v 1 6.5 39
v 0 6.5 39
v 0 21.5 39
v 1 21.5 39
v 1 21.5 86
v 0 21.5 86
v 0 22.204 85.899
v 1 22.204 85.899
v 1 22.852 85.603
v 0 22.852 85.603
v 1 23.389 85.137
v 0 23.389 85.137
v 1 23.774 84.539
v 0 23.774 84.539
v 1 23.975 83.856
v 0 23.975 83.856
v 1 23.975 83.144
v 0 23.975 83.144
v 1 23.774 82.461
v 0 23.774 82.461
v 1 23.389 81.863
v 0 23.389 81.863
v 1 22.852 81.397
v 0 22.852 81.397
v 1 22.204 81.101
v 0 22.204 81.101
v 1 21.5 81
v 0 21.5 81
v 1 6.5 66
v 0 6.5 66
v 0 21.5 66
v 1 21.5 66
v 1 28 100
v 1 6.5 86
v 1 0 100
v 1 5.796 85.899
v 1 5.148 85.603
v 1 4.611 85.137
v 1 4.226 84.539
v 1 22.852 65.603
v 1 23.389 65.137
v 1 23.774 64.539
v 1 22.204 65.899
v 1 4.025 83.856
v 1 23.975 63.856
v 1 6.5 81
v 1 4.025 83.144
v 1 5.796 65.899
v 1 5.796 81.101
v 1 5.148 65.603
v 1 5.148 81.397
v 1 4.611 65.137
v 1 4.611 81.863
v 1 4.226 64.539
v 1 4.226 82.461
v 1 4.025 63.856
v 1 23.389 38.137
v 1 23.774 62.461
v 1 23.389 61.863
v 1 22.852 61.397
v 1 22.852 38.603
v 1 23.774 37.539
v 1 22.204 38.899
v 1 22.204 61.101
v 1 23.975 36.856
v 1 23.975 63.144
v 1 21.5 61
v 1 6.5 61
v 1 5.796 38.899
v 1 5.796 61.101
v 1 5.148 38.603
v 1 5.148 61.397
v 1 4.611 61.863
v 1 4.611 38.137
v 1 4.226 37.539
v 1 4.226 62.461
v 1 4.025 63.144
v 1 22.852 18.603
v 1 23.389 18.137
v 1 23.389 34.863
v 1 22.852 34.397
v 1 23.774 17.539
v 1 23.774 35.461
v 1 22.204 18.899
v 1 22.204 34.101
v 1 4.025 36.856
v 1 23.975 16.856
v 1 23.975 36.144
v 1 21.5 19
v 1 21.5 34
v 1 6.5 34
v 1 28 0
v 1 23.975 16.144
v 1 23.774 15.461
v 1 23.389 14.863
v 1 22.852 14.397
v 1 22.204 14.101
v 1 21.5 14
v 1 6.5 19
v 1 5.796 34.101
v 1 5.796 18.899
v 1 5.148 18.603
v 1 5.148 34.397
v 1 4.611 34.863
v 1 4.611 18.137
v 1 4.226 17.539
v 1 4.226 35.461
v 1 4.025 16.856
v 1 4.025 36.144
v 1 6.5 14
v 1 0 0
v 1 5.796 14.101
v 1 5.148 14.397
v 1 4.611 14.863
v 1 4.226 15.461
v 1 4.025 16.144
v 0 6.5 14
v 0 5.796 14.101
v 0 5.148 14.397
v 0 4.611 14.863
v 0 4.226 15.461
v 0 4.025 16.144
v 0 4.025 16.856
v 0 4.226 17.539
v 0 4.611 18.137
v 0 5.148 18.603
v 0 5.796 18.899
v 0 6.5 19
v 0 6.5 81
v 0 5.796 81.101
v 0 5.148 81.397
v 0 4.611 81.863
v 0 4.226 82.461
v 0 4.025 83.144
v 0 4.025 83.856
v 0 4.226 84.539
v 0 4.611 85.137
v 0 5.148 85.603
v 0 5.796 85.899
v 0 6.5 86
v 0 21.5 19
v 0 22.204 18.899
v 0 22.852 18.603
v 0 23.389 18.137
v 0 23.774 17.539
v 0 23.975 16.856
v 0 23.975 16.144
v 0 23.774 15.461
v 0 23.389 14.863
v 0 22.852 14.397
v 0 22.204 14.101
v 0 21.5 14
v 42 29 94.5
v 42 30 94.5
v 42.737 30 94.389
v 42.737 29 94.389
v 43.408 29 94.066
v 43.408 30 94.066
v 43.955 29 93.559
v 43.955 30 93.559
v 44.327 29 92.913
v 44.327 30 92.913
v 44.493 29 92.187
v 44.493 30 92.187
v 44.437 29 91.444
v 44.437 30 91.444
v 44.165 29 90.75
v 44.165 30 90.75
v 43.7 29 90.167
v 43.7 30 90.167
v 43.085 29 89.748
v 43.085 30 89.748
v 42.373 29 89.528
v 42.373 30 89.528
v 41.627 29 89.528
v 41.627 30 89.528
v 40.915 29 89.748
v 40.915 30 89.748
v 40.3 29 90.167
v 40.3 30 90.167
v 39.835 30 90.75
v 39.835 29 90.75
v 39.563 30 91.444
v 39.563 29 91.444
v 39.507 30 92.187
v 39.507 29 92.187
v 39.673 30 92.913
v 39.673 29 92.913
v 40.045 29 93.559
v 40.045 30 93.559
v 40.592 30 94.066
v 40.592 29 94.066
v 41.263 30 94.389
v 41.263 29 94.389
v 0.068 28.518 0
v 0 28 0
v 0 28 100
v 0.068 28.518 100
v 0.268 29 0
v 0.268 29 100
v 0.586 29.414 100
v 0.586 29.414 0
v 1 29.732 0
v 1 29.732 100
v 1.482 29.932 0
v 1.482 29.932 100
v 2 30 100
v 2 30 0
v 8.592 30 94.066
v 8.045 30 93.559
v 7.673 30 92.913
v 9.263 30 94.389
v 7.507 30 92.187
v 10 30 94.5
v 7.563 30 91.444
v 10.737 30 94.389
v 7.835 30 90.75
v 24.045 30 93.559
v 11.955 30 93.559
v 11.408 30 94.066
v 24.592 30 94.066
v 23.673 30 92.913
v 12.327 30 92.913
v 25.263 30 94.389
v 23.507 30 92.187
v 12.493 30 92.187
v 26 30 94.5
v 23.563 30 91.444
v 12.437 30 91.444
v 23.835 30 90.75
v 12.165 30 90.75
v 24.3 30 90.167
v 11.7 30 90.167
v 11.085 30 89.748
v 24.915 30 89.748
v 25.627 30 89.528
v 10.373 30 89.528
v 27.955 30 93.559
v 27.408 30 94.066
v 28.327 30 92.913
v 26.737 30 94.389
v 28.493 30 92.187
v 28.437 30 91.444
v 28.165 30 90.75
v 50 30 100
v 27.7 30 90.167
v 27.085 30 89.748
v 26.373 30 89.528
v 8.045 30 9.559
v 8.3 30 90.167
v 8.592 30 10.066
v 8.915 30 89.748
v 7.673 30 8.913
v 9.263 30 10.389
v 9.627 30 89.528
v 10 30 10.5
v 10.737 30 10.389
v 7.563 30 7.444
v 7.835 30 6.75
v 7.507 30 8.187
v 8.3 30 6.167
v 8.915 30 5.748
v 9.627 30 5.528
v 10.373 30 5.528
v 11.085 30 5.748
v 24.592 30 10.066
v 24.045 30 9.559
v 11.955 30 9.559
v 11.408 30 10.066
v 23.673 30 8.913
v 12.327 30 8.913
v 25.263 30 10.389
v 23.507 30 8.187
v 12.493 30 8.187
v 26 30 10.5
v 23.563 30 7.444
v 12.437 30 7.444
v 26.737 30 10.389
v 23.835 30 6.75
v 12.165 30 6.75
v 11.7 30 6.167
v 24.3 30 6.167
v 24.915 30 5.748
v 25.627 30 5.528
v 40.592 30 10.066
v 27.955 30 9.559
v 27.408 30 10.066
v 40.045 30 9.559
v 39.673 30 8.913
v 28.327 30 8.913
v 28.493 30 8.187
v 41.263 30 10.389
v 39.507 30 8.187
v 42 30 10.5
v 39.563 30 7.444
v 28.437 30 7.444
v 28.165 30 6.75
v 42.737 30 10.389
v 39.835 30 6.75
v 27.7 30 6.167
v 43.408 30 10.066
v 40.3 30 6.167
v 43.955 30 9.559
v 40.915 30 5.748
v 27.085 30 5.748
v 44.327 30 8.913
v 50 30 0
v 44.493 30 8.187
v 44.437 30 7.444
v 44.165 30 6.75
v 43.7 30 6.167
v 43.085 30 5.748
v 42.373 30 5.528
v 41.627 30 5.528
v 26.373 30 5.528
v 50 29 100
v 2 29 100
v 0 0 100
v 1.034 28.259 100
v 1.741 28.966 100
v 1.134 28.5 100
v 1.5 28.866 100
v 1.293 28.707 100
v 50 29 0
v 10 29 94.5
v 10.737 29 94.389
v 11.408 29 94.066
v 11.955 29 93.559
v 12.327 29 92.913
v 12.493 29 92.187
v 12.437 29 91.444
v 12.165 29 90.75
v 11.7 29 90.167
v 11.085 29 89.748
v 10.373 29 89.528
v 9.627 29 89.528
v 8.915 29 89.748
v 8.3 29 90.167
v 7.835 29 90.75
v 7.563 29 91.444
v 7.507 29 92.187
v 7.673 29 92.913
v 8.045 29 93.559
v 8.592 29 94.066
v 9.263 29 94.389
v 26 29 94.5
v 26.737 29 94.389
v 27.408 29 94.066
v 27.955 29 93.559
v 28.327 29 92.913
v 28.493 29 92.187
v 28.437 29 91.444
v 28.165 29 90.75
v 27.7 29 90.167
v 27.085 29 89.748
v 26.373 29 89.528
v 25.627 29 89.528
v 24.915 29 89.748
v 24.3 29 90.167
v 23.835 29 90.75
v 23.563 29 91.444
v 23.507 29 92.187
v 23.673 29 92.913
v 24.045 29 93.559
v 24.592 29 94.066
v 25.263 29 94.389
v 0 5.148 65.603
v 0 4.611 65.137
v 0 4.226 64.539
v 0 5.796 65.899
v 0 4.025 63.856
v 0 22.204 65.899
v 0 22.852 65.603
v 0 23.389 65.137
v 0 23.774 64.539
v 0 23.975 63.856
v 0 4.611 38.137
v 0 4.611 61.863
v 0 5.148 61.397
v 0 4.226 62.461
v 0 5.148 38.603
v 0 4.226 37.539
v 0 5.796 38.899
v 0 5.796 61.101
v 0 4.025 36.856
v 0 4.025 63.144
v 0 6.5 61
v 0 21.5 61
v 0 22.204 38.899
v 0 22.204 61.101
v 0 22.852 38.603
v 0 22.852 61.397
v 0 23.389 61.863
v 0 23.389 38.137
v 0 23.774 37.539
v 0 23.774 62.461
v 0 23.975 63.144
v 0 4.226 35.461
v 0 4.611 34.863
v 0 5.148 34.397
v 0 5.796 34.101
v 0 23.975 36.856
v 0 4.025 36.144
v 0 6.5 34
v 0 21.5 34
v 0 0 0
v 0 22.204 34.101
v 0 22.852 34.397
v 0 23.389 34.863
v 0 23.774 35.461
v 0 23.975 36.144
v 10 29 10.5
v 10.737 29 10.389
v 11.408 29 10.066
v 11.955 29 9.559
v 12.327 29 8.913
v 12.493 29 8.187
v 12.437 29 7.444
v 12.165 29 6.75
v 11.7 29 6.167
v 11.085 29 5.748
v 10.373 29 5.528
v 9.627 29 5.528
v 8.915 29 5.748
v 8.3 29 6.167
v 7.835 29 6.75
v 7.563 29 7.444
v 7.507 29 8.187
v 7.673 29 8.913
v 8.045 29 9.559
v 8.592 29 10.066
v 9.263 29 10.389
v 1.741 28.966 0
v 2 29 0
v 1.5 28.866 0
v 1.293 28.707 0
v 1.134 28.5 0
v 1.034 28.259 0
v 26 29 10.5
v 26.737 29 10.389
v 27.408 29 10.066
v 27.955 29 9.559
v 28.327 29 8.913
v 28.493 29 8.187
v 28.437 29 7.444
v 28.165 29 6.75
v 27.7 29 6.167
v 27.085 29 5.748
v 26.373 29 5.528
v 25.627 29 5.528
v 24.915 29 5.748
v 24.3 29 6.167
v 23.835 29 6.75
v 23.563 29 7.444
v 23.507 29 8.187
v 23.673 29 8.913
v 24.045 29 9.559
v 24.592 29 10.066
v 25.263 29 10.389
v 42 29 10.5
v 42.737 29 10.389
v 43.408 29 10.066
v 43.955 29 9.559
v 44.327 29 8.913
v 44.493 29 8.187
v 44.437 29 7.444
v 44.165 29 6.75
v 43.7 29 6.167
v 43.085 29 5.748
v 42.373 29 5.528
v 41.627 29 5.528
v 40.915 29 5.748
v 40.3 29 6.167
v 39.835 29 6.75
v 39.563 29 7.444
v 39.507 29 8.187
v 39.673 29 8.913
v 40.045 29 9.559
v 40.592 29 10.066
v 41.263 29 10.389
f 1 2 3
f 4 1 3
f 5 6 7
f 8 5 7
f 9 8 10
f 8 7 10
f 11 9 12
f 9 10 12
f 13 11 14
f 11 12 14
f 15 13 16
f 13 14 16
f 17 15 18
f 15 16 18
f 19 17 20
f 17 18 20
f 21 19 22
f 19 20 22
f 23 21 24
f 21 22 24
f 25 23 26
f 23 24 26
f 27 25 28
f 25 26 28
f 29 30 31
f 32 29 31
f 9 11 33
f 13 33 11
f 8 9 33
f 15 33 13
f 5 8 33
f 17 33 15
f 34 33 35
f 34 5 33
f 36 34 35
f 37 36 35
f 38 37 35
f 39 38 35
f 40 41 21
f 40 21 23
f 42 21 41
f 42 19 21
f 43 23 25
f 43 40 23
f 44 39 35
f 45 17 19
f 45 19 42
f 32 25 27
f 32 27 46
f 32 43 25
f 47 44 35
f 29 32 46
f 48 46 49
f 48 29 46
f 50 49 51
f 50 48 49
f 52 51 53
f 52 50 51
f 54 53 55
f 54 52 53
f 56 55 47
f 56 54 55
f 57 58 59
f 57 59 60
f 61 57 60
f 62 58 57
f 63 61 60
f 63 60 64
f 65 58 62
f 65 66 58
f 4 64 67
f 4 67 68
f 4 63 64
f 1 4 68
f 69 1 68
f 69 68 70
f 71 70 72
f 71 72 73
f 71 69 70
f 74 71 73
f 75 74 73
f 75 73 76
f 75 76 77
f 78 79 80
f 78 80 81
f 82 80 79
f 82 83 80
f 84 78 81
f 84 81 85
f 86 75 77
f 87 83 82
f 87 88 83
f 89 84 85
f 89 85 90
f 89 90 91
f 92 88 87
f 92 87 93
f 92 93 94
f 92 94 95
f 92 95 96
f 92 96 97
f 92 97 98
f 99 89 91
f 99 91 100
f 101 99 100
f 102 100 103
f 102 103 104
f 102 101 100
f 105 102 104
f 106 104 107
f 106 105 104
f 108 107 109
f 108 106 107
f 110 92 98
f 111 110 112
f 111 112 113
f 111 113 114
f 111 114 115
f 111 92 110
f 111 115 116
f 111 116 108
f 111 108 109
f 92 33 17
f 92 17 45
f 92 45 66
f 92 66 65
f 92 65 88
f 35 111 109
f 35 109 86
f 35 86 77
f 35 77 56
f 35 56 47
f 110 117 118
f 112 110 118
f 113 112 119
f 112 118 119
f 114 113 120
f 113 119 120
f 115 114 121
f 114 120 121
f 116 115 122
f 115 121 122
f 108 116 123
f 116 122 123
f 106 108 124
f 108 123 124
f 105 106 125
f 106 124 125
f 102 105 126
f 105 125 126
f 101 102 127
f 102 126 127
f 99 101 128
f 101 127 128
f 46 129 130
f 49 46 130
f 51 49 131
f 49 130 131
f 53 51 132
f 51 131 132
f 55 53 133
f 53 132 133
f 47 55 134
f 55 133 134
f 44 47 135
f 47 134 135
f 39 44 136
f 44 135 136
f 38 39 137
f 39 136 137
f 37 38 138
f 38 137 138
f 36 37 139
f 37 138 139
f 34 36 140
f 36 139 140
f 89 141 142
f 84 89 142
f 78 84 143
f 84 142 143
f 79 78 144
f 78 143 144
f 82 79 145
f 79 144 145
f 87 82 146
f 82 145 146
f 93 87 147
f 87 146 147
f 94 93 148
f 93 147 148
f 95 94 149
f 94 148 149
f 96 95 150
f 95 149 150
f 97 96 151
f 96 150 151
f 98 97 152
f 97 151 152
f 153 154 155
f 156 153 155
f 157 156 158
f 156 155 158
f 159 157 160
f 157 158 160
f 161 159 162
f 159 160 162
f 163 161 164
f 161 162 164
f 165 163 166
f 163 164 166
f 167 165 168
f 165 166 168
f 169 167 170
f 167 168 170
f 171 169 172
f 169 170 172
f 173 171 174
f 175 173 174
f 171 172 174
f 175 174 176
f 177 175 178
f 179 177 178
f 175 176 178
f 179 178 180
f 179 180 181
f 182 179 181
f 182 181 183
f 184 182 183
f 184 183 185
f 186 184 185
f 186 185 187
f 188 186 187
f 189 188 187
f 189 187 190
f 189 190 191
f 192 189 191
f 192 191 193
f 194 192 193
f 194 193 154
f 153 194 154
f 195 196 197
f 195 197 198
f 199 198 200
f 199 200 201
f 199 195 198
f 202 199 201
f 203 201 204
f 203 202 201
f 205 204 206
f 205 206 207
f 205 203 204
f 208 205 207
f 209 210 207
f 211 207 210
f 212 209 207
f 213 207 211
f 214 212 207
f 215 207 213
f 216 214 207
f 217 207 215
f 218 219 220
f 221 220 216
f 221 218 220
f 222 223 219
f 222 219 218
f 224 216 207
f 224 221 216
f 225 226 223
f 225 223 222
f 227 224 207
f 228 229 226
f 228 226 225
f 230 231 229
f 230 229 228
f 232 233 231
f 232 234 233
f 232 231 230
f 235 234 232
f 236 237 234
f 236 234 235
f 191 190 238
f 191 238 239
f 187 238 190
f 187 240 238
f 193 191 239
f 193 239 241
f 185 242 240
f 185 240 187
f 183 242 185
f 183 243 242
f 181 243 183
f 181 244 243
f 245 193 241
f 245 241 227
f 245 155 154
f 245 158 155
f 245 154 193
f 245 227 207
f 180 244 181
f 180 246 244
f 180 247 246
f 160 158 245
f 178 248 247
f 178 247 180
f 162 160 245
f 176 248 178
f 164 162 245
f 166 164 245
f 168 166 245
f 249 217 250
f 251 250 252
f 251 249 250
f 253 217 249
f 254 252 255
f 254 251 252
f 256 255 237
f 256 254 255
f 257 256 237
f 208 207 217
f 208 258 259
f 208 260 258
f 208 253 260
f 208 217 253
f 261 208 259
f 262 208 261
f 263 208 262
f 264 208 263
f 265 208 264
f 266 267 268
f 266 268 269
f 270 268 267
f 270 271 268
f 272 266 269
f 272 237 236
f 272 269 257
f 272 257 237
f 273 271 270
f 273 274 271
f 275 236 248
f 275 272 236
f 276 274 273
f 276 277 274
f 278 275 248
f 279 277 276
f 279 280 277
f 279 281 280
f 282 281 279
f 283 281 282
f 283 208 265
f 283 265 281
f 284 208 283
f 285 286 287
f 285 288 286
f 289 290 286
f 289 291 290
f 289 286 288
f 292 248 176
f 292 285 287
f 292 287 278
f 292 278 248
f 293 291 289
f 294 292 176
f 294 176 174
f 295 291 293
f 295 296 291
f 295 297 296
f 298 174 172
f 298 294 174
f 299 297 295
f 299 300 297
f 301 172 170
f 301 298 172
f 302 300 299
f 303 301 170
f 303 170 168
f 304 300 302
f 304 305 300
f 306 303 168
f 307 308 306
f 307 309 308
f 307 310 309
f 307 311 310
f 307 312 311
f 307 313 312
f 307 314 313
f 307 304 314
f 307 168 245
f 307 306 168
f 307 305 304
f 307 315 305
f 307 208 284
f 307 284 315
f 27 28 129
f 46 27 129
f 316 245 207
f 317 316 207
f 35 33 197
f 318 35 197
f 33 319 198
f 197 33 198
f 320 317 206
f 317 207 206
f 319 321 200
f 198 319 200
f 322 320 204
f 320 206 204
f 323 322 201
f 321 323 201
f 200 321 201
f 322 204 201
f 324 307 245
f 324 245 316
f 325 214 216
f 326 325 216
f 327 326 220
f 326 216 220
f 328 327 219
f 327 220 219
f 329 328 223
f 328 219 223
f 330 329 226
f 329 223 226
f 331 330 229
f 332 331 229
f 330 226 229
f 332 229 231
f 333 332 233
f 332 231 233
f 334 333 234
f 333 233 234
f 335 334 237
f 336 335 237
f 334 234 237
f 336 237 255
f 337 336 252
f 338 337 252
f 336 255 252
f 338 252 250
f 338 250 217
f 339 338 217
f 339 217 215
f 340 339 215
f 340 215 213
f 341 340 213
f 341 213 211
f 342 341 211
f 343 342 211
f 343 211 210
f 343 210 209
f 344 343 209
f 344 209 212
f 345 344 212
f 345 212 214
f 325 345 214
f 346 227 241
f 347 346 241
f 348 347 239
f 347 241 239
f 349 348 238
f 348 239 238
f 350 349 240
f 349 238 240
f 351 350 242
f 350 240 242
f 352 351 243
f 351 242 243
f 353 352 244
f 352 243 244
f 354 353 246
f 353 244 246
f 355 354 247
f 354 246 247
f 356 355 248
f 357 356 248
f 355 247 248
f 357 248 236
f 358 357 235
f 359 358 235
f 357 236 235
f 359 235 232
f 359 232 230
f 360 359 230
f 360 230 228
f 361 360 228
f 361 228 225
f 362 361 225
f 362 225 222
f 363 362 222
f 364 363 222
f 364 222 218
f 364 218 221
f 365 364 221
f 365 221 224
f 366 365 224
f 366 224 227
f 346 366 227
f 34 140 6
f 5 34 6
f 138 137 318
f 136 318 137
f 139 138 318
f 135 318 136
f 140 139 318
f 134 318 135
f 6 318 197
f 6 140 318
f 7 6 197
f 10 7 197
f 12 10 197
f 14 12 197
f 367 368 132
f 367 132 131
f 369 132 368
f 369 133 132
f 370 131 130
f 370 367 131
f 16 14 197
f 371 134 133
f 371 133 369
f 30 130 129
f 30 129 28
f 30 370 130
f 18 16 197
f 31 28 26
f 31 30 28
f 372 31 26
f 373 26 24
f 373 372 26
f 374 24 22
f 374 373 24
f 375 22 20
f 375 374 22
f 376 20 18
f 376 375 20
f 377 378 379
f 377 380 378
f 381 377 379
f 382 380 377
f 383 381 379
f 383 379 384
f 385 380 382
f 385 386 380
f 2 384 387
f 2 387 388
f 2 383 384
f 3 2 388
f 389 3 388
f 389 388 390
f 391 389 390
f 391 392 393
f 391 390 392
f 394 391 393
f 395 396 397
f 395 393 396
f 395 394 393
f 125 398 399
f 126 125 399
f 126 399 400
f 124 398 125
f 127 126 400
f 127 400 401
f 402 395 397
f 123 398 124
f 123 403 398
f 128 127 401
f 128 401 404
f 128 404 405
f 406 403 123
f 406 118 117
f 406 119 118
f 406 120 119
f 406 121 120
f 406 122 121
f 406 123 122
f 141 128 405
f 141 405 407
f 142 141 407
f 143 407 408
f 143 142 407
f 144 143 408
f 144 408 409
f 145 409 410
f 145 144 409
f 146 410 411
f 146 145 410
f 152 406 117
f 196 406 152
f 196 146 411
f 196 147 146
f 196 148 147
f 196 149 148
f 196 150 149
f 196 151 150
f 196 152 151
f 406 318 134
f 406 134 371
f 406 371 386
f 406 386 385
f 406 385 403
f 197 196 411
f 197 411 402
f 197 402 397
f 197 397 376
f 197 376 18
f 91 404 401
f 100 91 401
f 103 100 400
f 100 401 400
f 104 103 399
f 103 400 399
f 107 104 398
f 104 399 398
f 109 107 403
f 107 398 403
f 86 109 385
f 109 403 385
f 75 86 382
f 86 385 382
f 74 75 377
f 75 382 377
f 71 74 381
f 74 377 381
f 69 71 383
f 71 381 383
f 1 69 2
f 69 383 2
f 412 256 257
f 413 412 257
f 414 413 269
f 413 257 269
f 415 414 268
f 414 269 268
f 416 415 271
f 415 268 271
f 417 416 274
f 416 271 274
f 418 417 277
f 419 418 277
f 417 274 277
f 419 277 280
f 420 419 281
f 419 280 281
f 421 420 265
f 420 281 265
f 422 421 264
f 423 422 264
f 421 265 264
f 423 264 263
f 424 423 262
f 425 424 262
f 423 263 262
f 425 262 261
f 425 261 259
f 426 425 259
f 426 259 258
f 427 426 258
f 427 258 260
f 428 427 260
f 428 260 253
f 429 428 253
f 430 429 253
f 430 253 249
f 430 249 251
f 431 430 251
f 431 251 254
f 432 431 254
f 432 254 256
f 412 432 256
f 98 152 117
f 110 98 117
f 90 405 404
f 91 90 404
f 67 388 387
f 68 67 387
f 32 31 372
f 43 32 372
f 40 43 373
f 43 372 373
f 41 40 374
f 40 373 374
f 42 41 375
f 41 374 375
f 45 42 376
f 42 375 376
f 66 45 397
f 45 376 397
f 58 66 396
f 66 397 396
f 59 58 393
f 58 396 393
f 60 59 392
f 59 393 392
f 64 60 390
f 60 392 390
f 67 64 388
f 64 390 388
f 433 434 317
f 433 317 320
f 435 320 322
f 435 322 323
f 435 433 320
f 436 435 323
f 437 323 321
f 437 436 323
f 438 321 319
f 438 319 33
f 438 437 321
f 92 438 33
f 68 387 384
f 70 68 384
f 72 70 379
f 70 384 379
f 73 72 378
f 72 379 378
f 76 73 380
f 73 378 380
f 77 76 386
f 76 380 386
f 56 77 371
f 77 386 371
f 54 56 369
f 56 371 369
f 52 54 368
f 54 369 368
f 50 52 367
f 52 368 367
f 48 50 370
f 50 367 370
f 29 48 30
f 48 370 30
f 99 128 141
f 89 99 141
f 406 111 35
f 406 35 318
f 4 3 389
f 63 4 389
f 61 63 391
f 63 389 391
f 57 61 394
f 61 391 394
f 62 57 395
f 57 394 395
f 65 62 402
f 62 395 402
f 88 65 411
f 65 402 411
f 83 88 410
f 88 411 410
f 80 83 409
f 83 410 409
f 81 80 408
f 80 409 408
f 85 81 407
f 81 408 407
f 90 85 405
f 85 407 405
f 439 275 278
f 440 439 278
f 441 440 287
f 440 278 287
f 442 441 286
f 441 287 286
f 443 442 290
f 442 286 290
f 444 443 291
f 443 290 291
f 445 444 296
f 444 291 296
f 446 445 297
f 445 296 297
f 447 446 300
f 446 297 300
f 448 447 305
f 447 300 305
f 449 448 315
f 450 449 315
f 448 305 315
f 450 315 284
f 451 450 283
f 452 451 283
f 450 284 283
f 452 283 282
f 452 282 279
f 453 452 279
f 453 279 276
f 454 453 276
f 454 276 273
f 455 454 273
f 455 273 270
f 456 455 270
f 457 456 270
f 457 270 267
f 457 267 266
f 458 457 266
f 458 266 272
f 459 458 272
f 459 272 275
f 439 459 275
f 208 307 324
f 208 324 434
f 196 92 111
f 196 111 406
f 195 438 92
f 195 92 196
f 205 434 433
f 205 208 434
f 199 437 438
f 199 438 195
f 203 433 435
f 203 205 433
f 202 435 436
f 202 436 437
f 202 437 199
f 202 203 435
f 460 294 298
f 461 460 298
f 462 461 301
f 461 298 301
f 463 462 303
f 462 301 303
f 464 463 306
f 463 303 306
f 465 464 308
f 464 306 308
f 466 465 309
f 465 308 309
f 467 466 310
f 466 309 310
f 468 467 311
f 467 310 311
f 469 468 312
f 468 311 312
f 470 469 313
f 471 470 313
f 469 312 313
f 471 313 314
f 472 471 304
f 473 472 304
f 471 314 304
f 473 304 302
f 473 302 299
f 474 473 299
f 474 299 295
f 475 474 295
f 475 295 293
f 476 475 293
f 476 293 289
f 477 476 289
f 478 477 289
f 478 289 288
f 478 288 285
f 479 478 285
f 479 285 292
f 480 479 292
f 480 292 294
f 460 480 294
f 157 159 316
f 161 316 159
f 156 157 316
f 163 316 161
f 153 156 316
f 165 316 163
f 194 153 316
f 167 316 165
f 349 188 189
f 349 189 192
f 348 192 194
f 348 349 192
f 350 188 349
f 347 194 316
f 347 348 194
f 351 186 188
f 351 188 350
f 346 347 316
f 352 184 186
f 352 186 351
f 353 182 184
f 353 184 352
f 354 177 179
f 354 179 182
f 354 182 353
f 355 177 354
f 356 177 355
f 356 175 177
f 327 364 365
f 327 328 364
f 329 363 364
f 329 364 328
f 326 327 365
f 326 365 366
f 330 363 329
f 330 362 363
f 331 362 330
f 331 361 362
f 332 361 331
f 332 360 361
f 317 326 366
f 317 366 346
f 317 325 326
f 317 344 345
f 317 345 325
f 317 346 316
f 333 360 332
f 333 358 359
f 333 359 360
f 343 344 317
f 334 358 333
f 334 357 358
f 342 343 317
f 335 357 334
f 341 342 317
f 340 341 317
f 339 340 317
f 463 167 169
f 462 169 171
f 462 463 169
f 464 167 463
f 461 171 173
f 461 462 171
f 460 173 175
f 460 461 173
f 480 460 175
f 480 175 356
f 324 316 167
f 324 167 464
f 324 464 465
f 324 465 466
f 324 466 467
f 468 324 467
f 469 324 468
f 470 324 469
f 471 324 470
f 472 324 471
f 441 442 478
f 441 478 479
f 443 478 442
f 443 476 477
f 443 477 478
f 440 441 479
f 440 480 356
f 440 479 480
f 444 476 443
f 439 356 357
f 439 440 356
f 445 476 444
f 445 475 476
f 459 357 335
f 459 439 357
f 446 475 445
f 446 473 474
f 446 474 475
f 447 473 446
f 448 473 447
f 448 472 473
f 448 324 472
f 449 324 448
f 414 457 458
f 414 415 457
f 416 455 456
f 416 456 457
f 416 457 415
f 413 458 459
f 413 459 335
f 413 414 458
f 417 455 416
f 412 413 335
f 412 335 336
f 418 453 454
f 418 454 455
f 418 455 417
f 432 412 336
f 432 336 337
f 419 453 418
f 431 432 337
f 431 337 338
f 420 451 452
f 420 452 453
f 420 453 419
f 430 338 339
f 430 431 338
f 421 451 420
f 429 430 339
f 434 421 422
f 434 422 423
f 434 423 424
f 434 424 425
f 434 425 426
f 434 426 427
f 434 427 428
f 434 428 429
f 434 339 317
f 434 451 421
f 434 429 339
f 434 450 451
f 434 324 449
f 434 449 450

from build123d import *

# Parameters (mm, degrees)
BASE_FLANGE1_DEPTH = 100
CUT_EXTRUDE3_REACH = 117.758
SKETCH8_R          = 2.5
CUT_EXTRUDE4_REACH = 117.758
SKETCH11_R         = 2.5


# Sheet-metal steps are written as plain solids
with BuildPart() as part:
    # Sketch2 → Base-Flange1 (new body)
    with BuildSketch(Plane.XY):
        with BuildLine():
            Line((0, 0), (0, 28))
            ThreePointArc((0, 28), (0.585786438, 29.414213562), (2, 30))
            Line((2, 30), (50, 30))
            Line((50, 30), (50, 29))
            Line((50, 29), (2, 29))
            ThreePointArc((2, 29), (1.292893219, 28.707106781), (1, 28))
            Line((1, 28), (1, 0))
            Line((1, 0), (0, 0))
        make_face()
    extrude(amount=BASE_FLANGE1_DEPTH)

    # Sketch8 → Cut-Extrude3 (cut, up to next)
    with BuildSketch(Plane(origin=(0, 30, 0), x_dir=(1, 0, 0), z_dir=(0, 1, 0)), mode=Mode.PRIVATE) as cut_extrude3_sk1:
        with Locations(Location((42, -8, 0), (0, 0, 270))):
            Circle(SKETCH8_R)
    cut_extrude3_tool1 = extrude(cut_extrude3_sk1.sketch, amount=-CUT_EXTRUDE3_REACH, mode=Mode.PRIVATE) & part.part
    # Sketch8 → Cut-Extrude3 (cut, up to next)
    with BuildSketch(Plane(origin=(0, 30, 0), x_dir=(1, 0, 0), z_dir=(0, 1, 0)), mode=Mode.PRIVATE) as cut_extrude3_sk2:
        with Locations(Location((10, -8, 0), (0, 0, 270))):
            Circle(SKETCH8_R)
    cut_extrude3_tool2 = extrude(cut_extrude3_sk2.sketch, amount=-CUT_EXTRUDE3_REACH, mode=Mode.PRIVATE) & part.part
    # Sketch8 → Cut-Extrude3 (cut, up to next)
    with BuildSketch(Plane(origin=(0, 30, 0), x_dir=(1, 0, 0), z_dir=(0, 1, 0)), mode=Mode.PRIVATE) as cut_extrude3_sk3:
        with Locations(Location((42, -92, 0), (0, 0, 270))):
            Circle(SKETCH8_R)
    cut_extrude3_tool3 = extrude(cut_extrude3_sk3.sketch, amount=-CUT_EXTRUDE3_REACH, mode=Mode.PRIVATE) & part.part
    # Sketch8 → Cut-Extrude3 (cut, up to next)
    with BuildSketch(Plane(origin=(0, 30, 0), x_dir=(1, 0, 0), z_dir=(0, 1, 0)), mode=Mode.PRIVATE) as cut_extrude3_sk4:
        with Locations(Location((10, -92, 0), (0, 0, 270))):
            Circle(SKETCH8_R)
    cut_extrude3_tool4 = extrude(cut_extrude3_sk4.sketch, amount=-CUT_EXTRUDE3_REACH, mode=Mode.PRIVATE) & part.part
    # Sketch8 → Cut-Extrude3 (cut, up to next)
    with BuildSketch(Plane(origin=(0, 30, 0), x_dir=(1, 0, 0), z_dir=(0, 1, 0)), mode=Mode.PRIVATE) as cut_extrude3_sk5:
        with Locations(Location((26, -8, 0), (0, 0, 270))):
            Circle(SKETCH8_R)
    cut_extrude3_tool5 = extrude(cut_extrude3_sk5.sketch, amount=-CUT_EXTRUDE3_REACH, mode=Mode.PRIVATE) & part.part
    # Sketch8 → Cut-Extrude3 (cut, up to next)
    with BuildSketch(Plane(origin=(0, 30, 0), x_dir=(1, 0, 0), z_dir=(0, 1, 0)), mode=Mode.PRIVATE) as cut_extrude3_sk6:
        with Locations(Location((26, -92, 0), (0, 0, 270))):
            Circle(SKETCH8_R)
    cut_extrude3_tool6 = extrude(cut_extrude3_sk6.sketch, amount=-CUT_EXTRUDE3_REACH, mode=Mode.PRIVATE) & part.part
    add(cut_extrude3_tool1.solids().sort_by_distance((42, 30, 8))[0], mode=Mode.SUBTRACT)
    add(cut_extrude3_tool2.solids().sort_by_distance((10, 30, 8))[0], mode=Mode.SUBTRACT)
    add(cut_extrude3_tool3.solids().sort_by_distance((42, 30, 92))[0], mode=Mode.SUBTRACT)
    add(cut_extrude3_tool4.solids().sort_by_distance((10, 30, 92))[0], mode=Mode.SUBTRACT)
    add(cut_extrude3_tool5.solids().sort_by_distance((26, 30, 8))[0], mode=Mode.SUBTRACT)
    add(cut_extrude3_tool6.solids().sort_by_distance((26, 30, 92))[0], mode=Mode.SUBTRACT)

    # Sketch11 → Cut-Extrude4 (cut, up to next)
    with BuildSketch(Plane.ZY, mode=Mode.PRIVATE) as cut_extrude4_sk1:
        with BuildLine():
            ThreePointArc((19, 21.5), (16.5, 24), (14, 21.5))
            Line((14, 21.5), (14, 13.999999995))
            ThreePointArc((14, 13.999999995), (16.499999997, 16.5), (19, 14))
            Line((19, 14), (19, 21.5))
        make_face()
    cut_extrude4_tool1 = extrude(cut_extrude4_sk1.sketch, amount=-CUT_EXTRUDE4_REACH, mode=Mode.PRIVATE) & part.part
    # Sketch11 → Cut-Extrude4 (cut, up to next)
    with BuildSketch(Plane.ZY, mode=Mode.PRIVATE) as cut_extrude4_sk2:
        with BuildLine():
            ThreePointArc((19, 14), (16.500000003, 11.5), (14, 13.999999995))
            Line((14, 13.999999995), (14, 6.5))
            ThreePointArc((14, 6.5), (16.5, 4), (19, 6.5))
            Line((19, 6.5), (19, 14))
        make_face()
    cut_extrude4_tool2 = extrude(cut_extrude4_sk2.sketch, amount=-CUT_EXTRUDE4_REACH, mode=Mode.PRIVATE) & part.part
    # Sketch11 → Cut-Extrude4 (cut, up to next)
    with BuildSketch(Plane.ZY, mode=Mode.PRIVATE) as cut_extrude4_sk3:
        with Locations((16.5, 14)):
            Circle(SKETCH11_R)
    cut_extrude4_tool3 = extrude(cut_extrude4_sk3.sketch, amount=-CUT_EXTRUDE4_REACH, mode=Mode.PRIVATE) & part.part
    # Sketch11 → Cut-Extrude4 (cut, up to next)
    with BuildSketch(Plane.ZY, mode=Mode.PRIVATE) as cut_extrude4_sk4:
        with BuildLine():
            ThreePointArc((39, 14), (36.5, 11.5), (34, 14))
            Line((34, 14), (34, 6.5))
            ThreePointArc((34, 6.5), (36.5, 4), (39, 6.5))
            Line((39, 6.5), (39, 14))
        make_face()
    cut_extrude4_tool4 = extrude(cut_extrude4_sk4.sketch, amount=-CUT_EXTRUDE4_REACH, mode=Mode.PRIVATE) & part.part
    # Sketch11 → Cut-Extrude4 (cut, up to next)
    with BuildSketch(Plane.ZY, mode=Mode.PRIVATE) as cut_extrude4_sk5:
        with Locations((36.5, 14)):
            Circle(SKETCH11_R)
    cut_extrude4_tool5 = extrude(cut_extrude4_sk5.sketch, amount=-CUT_EXTRUDE4_REACH, mode=Mode.PRIVATE) & part.part
    # Sketch11 → Cut-Extrude4 (cut, up to next)
    with BuildSketch(Plane.ZY, mode=Mode.PRIVATE) as cut_extrude4_sk6:
        with BuildLine():
            ThreePointArc((39, 21.5), (36.5, 24), (34, 21.5))
            Line((34, 21.5), (34, 14))
            ThreePointArc((34, 14), (36.5, 16.5), (39, 14))
            Line((39, 14), (39, 21.5))
        make_face()
    cut_extrude4_tool6 = extrude(cut_extrude4_sk6.sketch, amount=-CUT_EXTRUDE4_REACH, mode=Mode.PRIVATE) & part.part
    # Sketch11 → Cut-Extrude4 (cut, up to next)
    with BuildSketch(Plane.ZY, mode=Mode.PRIVATE) as cut_extrude4_sk7:
        with BuildLine():
            Line((86, 14), (86, 21.5))
            ThreePointArc((86, 21.5), (83.5, 24), (81, 21.5))
            Line((81, 21.5), (81, 14))
            ThreePointArc((81, 14), (83.5, 16.5), (86, 14))
        make_face()
    cut_extrude4_tool7 = extrude(cut_extrude4_sk7.sketch, amount=-CUT_EXTRUDE4_REACH, mode=Mode.PRIVATE) & part.part
    # Sketch11 → Cut-Extrude4 (cut, up to next)
    with BuildSketch(Plane.ZY, mode=Mode.PRIVATE) as cut_extrude4_sk8:
        with BuildLine():
            Line((86, 6.5), (86, 14))
            ThreePointArc((86, 14), (83.5, 11.5), (81, 14))
            Line((81, 14), (81, 6.5))
            ThreePointArc((81, 6.5), (83.5, 4), (86, 6.5))
        make_face()
    cut_extrude4_tool8 = extrude(cut_extrude4_sk8.sketch, amount=-CUT_EXTRUDE4_REACH, mode=Mode.PRIVATE) & part.part
    # Sketch11 → Cut-Extrude4 (cut, up to next)
    with BuildSketch(Plane.ZY, mode=Mode.PRIVATE) as cut_extrude4_sk9:
        with Locations((83.5, 14)):
            Circle(SKETCH11_R)
    cut_extrude4_tool9 = extrude(cut_extrude4_sk9.sketch, amount=-CUT_EXTRUDE4_REACH, mode=Mode.PRIVATE) & part.part
    # Sketch11 → Cut-Extrude4 (cut, up to next)
    with BuildSketch(Plane.ZY, mode=Mode.PRIVATE) as cut_extrude4_sk10:
        with BuildLine():
            ThreePointArc((66, 21.5), (63.5, 24), (61, 21.5))
            Line((61, 21.5), (61, 14))
            ThreePointArc((61, 14), (63.5, 16.5), (66, 14))
            Line((66, 14), (66, 21.5))
        make_face()
    cut_extrude4_tool10 = extrude(cut_extrude4_sk10.sketch, amount=-CUT_EXTRUDE4_REACH, mode=Mode.PRIVATE) & part.part
    # Sketch11 → Cut-Extrude4 (cut, up to next)
    with BuildSketch(Plane.ZY, mode=Mode.PRIVATE) as cut_extrude4_sk11:
        with Locations((63.5, 14)):
            Circle(SKETCH11_R)
    cut_extrude4_tool11 = extrude(cut_extrude4_sk11.sketch, amount=-CUT_EXTRUDE4_REACH, mode=Mode.PRIVATE) & part.part
    # Sketch11 → Cut-Extrude4 (cut, up to next)
    with BuildSketch(Plane.ZY, mode=Mode.PRIVATE) as cut_extrude4_sk12:
        with BuildLine():
            ThreePointArc((66, 14), (63.5, 11.5), (61, 14))
            Line((61, 14), (61, 6.5))
            ThreePointArc((61, 6.5), (63.5, 4), (66, 6.5))
            Line((66, 6.5), (66, 14))
        make_face()
    cut_extrude4_tool12 = extrude(cut_extrude4_sk12.sketch, amount=-CUT_EXTRUDE4_REACH, mode=Mode.PRIVATE) & part.part
    add(cut_extrude4_tool1.solids().sort_by_distance((0, 19.713495, 16.5))[0], mode=Mode.SUBTRACT)
    add(cut_extrude4_tool2.solids().sort_by_distance((0, 8.286505, 16.5))[0], mode=Mode.SUBTRACT)
    add(cut_extrude4_tool3.solids().sort_by_distance((0, 14, 16.5))[0], mode=Mode.SUBTRACT)
    add(cut_extrude4_tool4.solids().sort_by_distance((0, 8.286505, 36.5))[0], mode=Mode.SUBTRACT)
    add(cut_extrude4_tool5.solids().sort_by_distance((0, 14, 36.5))[0], mode=Mode.SUBTRACT)
    add(cut_extrude4_tool6.solids().sort_by_distance((0, 19.713495, 36.5))[0], mode=Mode.SUBTRACT)
    add(cut_extrude4_tool7.solids().sort_by_distance((0, 19.713495, 83.5))[0], mode=Mode.SUBTRACT)
    add(cut_extrude4_tool8.solids().sort_by_distance((0, 8.286505, 83.5))[0], mode=Mode.SUBTRACT)
    add(cut_extrude4_tool9.solids().sort_by_distance((0, 14, 83.5))[0], mode=Mode.SUBTRACT)
    add(cut_extrude4_tool10.solids().sort_by_distance((0, 19.713495, 63.5))[0], mode=Mode.SUBTRACT)
    add(cut_extrude4_tool11.solids().sort_by_distance((0, 14, 63.5))[0], mode=Mode.SUBTRACT)
    add(cut_extrude4_tool12.solids().sort_by_distance((0, 8.286505, 63.5))[0], mode=Mode.SUBTRACT)


solid = part.part
